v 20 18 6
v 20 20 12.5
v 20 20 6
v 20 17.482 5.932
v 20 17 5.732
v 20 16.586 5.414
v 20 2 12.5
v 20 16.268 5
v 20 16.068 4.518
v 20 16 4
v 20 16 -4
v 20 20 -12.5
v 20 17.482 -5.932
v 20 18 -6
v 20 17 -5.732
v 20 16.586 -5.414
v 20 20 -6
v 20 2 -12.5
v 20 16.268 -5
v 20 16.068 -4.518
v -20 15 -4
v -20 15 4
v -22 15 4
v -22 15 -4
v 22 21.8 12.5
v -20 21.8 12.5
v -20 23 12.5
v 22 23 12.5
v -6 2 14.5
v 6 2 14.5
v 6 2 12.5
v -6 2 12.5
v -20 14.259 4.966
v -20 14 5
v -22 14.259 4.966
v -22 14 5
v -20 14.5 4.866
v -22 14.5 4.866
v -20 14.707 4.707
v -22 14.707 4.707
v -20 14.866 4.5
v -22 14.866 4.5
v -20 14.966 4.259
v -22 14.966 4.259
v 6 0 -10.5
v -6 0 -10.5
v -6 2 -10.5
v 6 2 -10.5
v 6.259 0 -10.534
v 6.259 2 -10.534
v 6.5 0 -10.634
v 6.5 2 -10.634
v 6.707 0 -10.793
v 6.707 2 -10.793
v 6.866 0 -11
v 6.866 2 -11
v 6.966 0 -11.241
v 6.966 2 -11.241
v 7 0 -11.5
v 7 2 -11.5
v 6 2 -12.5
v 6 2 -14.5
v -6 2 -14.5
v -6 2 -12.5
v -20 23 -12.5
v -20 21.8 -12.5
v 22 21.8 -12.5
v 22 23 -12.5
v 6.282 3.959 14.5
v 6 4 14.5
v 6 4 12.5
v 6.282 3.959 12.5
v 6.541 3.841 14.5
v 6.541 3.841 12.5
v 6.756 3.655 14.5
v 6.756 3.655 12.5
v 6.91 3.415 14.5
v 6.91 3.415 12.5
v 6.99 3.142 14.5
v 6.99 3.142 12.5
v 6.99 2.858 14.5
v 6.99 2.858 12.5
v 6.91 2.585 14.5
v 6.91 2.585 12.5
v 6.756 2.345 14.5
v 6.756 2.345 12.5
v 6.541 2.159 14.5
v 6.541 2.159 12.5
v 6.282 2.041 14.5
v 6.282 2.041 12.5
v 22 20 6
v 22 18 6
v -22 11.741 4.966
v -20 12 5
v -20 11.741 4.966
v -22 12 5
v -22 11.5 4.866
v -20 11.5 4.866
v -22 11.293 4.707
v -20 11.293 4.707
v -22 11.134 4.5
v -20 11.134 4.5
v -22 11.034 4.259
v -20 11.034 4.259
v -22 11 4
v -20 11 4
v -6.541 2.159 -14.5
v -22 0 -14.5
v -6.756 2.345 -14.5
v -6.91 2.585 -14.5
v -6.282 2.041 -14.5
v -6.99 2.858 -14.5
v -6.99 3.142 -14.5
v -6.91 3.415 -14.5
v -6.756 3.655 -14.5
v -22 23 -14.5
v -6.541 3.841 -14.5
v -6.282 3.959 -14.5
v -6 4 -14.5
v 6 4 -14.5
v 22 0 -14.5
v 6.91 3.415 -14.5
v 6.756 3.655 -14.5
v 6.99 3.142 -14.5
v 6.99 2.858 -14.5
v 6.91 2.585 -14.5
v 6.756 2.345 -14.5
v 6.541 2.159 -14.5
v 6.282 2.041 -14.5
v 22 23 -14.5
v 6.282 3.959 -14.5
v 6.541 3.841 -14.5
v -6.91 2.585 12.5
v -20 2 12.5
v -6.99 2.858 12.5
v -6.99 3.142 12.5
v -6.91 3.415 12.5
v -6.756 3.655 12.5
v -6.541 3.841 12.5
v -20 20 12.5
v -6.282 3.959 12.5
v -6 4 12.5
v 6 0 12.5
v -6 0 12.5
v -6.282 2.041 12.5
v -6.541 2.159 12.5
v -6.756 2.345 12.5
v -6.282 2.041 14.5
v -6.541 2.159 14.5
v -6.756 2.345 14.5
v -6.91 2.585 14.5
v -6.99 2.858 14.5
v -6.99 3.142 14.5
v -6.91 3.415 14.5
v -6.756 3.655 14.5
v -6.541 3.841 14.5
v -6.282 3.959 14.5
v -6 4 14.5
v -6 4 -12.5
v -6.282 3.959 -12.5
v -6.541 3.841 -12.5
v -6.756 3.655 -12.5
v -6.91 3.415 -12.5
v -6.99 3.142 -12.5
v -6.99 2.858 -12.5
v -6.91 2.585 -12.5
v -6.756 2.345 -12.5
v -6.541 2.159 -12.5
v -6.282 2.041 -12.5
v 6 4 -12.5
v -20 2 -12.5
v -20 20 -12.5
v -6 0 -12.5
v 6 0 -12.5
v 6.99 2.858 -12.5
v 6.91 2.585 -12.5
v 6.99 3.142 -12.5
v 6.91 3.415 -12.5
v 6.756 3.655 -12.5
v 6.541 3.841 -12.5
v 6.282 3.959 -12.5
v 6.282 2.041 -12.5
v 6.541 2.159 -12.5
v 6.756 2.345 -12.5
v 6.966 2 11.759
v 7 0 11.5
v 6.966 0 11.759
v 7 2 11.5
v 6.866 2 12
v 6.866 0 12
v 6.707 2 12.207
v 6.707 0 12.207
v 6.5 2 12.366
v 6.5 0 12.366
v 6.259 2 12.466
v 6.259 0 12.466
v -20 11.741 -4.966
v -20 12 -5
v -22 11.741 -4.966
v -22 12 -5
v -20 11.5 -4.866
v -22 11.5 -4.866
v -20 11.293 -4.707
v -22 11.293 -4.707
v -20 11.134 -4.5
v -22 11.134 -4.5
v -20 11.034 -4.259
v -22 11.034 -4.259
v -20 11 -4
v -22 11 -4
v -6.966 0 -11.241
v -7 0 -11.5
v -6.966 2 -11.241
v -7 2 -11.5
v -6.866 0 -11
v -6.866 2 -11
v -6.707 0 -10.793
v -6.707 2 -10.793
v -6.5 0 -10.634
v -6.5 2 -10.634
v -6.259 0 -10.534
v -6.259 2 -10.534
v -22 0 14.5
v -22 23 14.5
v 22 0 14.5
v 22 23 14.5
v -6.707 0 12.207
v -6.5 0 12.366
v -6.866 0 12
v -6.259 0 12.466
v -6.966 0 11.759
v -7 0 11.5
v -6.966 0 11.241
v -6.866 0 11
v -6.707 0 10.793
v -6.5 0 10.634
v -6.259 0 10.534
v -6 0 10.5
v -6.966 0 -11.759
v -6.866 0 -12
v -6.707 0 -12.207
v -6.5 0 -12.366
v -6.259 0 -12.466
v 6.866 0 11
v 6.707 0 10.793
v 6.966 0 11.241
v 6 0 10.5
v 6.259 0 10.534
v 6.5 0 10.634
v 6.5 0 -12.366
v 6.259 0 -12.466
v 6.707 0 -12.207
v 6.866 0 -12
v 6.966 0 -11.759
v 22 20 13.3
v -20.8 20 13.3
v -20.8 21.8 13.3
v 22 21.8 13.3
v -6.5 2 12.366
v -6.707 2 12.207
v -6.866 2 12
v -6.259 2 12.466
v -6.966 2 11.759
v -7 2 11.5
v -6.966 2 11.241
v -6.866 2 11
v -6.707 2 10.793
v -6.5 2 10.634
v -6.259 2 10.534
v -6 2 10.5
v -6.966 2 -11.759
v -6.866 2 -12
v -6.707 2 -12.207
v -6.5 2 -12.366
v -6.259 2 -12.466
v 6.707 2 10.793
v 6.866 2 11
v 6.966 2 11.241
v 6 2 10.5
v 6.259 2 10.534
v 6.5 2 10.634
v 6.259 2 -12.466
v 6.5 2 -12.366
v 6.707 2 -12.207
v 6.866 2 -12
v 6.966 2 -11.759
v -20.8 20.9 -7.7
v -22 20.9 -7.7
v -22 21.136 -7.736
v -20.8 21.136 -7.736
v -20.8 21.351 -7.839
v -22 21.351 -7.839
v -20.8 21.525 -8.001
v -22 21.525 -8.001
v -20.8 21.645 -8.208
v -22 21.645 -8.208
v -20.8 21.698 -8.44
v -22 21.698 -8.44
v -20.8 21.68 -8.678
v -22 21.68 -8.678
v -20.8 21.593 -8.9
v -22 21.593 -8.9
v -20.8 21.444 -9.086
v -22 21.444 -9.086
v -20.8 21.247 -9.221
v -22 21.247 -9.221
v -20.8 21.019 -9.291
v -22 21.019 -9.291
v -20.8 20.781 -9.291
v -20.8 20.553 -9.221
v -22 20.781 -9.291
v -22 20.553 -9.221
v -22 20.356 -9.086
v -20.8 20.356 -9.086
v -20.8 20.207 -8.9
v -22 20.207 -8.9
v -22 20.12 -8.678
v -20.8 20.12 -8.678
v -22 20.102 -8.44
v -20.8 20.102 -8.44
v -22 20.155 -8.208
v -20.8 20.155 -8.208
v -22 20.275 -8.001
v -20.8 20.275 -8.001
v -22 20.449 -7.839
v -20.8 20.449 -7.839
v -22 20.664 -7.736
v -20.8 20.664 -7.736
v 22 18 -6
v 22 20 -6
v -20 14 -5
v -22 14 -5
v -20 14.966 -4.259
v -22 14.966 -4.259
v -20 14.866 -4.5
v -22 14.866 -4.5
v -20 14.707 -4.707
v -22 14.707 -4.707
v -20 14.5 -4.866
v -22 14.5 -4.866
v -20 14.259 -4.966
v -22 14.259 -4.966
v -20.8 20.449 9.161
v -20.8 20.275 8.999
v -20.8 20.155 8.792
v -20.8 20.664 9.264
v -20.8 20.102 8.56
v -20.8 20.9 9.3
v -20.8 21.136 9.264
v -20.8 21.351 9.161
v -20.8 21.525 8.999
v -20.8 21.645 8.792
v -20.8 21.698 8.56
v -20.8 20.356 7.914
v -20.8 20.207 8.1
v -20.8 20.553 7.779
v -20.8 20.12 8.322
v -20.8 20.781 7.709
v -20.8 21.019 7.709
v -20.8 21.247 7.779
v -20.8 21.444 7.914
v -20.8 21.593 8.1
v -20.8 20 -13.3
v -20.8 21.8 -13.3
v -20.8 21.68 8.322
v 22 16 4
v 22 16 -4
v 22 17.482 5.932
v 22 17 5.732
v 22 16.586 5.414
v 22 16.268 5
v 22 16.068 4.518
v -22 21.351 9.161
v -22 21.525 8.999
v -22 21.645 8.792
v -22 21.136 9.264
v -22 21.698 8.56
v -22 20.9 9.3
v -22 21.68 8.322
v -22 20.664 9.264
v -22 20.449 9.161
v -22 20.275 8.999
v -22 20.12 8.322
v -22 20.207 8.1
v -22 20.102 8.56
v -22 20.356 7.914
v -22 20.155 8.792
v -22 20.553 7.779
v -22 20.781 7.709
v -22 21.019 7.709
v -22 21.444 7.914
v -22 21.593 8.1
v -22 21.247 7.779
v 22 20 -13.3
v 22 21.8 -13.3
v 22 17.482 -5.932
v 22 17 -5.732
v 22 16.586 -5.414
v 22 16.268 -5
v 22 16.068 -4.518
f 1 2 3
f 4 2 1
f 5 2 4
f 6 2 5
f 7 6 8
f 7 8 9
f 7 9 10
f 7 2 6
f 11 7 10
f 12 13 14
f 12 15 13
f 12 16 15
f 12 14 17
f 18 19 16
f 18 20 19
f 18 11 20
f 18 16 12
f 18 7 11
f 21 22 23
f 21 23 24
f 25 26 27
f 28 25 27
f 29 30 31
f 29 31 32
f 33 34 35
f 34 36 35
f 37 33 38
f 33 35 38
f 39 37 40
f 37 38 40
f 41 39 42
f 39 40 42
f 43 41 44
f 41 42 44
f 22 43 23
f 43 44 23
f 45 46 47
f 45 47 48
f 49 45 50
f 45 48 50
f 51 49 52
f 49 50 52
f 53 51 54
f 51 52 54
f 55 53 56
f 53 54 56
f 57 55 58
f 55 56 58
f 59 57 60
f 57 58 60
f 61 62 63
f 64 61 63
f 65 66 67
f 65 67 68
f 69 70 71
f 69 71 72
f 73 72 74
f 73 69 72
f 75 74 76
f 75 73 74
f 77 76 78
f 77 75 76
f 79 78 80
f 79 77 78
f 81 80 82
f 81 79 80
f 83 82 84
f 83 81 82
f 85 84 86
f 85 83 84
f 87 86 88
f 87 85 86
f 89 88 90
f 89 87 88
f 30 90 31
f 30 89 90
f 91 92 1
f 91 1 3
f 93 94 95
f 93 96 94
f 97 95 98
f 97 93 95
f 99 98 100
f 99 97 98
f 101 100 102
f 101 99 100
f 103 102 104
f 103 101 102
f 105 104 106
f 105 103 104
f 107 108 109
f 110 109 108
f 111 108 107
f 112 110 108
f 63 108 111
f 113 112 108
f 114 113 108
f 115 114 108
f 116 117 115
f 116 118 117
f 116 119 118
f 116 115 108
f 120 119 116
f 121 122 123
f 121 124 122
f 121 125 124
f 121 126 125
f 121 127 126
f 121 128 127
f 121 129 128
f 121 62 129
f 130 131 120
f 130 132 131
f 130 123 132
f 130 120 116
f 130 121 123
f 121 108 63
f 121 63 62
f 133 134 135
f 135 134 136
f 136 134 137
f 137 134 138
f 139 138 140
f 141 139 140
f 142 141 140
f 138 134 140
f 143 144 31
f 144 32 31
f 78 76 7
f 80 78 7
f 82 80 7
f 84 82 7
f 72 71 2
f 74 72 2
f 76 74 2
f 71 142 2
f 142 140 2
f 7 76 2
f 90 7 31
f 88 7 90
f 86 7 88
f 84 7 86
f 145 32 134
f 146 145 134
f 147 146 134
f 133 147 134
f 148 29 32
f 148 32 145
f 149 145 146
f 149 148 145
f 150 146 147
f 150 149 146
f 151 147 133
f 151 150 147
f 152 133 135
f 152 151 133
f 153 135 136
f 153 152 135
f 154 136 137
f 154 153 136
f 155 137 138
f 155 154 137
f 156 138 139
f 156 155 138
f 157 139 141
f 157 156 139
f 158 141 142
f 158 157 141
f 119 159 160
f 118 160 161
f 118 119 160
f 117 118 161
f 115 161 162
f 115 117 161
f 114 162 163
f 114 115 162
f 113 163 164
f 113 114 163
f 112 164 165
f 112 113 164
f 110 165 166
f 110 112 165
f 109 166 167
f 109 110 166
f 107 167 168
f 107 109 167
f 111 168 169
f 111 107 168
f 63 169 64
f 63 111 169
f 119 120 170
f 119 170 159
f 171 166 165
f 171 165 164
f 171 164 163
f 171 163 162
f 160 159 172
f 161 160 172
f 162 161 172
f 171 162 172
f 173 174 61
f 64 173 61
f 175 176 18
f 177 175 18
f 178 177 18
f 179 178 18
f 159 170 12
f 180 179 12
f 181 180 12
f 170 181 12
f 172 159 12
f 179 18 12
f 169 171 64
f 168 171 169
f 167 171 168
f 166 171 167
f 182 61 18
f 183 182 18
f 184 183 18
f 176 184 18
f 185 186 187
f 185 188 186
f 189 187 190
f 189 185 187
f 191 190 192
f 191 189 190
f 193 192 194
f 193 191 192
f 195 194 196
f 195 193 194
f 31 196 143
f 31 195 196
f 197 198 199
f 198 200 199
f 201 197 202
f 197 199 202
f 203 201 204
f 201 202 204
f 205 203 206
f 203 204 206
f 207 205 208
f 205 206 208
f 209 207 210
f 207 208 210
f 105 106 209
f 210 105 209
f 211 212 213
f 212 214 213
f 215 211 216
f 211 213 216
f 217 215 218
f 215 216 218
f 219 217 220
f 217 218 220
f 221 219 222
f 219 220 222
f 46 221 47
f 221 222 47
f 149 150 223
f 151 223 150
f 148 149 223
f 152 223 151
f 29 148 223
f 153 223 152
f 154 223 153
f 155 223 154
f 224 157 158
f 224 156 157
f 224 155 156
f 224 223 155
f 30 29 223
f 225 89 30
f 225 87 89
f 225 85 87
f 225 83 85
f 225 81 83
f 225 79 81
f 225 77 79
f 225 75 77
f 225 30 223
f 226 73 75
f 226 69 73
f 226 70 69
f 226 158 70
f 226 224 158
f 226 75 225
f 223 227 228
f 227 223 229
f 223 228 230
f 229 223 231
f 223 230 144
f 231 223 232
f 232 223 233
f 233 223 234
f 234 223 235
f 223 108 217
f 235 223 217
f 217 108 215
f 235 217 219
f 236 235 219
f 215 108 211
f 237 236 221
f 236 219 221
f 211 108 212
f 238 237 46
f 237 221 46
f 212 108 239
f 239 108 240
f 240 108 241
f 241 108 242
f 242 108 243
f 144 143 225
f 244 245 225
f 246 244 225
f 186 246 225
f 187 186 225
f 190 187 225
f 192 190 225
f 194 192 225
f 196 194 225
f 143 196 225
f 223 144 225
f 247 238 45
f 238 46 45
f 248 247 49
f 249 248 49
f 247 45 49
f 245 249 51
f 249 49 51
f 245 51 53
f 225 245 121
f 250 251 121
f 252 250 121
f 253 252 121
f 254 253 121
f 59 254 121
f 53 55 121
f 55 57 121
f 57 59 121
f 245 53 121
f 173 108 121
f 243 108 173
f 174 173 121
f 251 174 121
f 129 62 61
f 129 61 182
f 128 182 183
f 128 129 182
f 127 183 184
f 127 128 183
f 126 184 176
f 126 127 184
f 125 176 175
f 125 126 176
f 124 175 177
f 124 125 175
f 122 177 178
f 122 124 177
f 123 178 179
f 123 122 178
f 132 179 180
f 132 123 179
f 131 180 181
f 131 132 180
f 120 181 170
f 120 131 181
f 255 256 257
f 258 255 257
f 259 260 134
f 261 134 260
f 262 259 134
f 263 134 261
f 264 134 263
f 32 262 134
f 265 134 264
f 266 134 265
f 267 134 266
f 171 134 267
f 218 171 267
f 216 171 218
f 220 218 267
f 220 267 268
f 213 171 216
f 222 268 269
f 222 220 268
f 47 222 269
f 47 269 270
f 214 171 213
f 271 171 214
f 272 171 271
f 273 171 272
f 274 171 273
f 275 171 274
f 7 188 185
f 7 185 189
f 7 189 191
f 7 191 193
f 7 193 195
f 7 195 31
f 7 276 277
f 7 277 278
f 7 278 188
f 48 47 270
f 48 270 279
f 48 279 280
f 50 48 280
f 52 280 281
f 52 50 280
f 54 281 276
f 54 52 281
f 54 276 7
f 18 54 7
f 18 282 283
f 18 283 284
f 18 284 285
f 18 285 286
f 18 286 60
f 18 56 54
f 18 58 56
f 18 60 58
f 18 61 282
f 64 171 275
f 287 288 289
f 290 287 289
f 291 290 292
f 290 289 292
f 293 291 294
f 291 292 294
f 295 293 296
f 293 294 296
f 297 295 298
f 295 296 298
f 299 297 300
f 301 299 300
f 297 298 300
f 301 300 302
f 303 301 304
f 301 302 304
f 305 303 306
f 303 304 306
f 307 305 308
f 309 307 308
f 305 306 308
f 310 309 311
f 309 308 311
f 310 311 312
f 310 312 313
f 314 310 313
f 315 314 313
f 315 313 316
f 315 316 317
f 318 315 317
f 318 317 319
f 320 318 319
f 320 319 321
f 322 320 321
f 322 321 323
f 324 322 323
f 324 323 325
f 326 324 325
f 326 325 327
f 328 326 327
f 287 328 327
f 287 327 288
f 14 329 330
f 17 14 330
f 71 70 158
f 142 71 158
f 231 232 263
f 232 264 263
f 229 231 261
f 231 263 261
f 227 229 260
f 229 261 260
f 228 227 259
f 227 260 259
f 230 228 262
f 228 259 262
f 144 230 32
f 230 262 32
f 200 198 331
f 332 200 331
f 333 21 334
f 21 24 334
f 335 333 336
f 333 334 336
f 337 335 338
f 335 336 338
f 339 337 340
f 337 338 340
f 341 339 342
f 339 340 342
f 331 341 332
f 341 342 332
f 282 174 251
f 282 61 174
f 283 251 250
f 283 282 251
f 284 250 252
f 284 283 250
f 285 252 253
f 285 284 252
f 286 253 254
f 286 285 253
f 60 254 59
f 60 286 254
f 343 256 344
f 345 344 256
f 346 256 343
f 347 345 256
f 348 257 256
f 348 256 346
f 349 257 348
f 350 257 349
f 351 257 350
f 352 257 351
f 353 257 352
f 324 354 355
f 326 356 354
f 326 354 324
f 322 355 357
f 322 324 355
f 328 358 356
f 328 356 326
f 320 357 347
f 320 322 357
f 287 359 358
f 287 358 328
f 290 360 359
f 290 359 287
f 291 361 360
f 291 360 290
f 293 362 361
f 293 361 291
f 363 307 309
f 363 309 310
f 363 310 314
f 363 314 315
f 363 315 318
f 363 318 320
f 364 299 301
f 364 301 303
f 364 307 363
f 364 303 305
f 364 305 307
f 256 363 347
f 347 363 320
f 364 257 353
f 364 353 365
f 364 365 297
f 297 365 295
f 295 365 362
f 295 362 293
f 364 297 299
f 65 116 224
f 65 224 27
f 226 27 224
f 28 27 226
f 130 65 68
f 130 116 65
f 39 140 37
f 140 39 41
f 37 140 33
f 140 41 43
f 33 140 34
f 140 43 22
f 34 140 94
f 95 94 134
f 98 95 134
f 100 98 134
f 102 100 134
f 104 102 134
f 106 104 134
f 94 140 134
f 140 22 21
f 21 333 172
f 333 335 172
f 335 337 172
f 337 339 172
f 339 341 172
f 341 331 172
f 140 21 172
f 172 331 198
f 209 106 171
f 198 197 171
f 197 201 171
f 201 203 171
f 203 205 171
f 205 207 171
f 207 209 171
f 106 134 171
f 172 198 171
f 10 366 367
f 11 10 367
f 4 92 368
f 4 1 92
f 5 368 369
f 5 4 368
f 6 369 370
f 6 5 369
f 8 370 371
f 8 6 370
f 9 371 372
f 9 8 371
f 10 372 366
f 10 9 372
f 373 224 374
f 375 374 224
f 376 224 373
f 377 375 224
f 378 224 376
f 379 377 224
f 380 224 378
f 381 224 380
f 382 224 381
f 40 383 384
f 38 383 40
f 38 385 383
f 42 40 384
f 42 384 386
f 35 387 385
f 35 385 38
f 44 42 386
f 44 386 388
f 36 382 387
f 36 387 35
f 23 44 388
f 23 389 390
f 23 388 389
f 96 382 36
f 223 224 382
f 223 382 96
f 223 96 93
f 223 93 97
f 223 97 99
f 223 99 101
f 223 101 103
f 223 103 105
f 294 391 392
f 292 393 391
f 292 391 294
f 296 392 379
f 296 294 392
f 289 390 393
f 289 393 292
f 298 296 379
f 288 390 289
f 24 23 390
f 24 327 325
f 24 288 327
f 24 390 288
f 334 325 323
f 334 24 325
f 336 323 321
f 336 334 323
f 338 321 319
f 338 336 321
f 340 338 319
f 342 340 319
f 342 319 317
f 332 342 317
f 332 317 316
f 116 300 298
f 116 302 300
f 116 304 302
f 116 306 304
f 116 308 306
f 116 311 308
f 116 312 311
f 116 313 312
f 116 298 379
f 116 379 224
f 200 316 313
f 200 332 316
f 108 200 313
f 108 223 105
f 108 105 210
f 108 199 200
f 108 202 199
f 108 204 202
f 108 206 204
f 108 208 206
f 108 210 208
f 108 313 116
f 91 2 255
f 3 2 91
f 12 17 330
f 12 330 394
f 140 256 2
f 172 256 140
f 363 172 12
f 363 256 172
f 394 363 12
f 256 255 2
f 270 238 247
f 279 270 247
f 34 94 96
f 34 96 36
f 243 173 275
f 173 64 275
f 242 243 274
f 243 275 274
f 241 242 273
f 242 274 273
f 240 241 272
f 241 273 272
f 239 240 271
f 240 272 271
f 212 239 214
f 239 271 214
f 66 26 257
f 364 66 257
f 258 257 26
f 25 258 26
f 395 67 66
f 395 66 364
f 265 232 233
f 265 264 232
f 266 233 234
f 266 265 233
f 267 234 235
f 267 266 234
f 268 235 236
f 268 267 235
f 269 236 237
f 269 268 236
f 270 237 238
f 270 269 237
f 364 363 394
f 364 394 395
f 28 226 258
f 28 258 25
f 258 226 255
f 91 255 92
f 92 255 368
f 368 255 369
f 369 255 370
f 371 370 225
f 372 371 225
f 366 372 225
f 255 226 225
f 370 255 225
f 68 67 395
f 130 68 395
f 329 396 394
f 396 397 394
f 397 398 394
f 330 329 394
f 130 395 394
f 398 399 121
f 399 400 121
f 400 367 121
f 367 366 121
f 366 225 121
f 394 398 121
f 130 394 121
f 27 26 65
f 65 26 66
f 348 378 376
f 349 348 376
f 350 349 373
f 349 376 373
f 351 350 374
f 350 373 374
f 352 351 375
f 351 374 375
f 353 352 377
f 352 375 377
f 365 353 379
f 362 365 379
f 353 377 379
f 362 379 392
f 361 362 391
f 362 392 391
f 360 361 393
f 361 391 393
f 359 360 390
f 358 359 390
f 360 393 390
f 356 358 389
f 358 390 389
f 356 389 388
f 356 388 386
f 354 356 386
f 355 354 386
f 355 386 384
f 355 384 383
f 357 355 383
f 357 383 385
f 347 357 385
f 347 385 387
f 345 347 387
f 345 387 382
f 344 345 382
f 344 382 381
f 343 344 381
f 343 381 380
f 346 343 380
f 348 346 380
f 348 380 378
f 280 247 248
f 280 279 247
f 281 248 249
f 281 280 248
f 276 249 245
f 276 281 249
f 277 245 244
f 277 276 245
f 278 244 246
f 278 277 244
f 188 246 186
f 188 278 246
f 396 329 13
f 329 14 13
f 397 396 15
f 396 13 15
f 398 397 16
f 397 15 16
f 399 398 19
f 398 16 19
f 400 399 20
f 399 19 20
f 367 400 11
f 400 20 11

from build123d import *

# Parameters (mm, degrees)
SKETCH_1_W             = 44
SKETCH_1_H             = 29
EXTRUDE_1_DEPTH        = 23
SHELL_1_T              = -2
CUT_EXTRUDE_1_REACH    = 53.723
SKETCH_2_W             = 12
SKETCH_2_H             = 7
CUT_EXTRUDE_2_REACH    = 52.032
SKETCH_3_W             = 10
SKETCH_3_H             = 4
FILLET_1_R             = 1
FILLET_2_R             = 2
CUT_EXTRUDE_START      = -2
SKETCH_4_W             = 25
SKETCH_4_H             = 3
CUT_EXTRUDE_3_DEPTH    = 2
SKETCH_5_W             = 26.6
SKETCH_5_H             = 1.8
CUT_EXTRUDE_4_DEPTH    = 42.8
CUT_EXTRUDE_5_REACH    = 53.723
SKETCH_6_R             = 0.8
CUT_EXTRUDE_6_REACH    = 36.975
SKETCH_8_W             = 14
SKETCH_8_H             = 2
CUT_EXTRUDE_7_REACH    = 45.058
SKETCH_9_W             = 14
SKETCH_9_H             = 2
FILLET_3_R             = 1
FILLET_4_R             = 1
FILLET_3_OF_MIRROR_1_R = 1
FILLET_4_OF_MIRROR_1_R = 1


# Some blends are built 0.0001 mm under size
with BuildPart() as part:
    # 草图1 → 凸台-拉伸1 (new body)
    with BuildSketch(Plane(origin=(0, 0, 0), x_dir=(1, 0, 0), z_dir=(0, 1, 0))):
        Rectangle(SKETCH_1_W, SKETCH_1_H)
    extrude(amount=EXTRUDE_1_DEPTH)

    # 抽壳1
    shell_1_openings = [part.faces().sort_by_distance(p)[0] for p in [
        (0, 23, 0),
    ]]
    offset(amount=SHELL_1_T, openings=shell_1_openings, kind=Kind.INTERSECTION)

    # 草图2 → 切除-拉伸1 (cut, up to next)
    with BuildSketch(Plane(origin=(22, 0, 0), x_dir=(0, 0, -1), z_dir=(1, 0, 0)), mode=Mode.PRIVATE) as cut_extrude_1_sk1:
        with Locations((0, 19.5)):
            Rectangle(SKETCH_2_W, SKETCH_2_H)
    cut_extrude_1_tool1 = extrude(cut_extrude_1_sk1.sketch, amount=-CUT_EXTRUDE_1_REACH, mode=Mode.PRIVATE) & part.part
    add(cut_extrude_1_tool1.solids().sort_by_distance((22, 19.5, 0))[0], mode=Mode.SUBTRACT)

    # 草图3 → 切除-拉伸2 (cut, up to next)
    with BuildSketch(Plane(origin=(-20, 0, 0), x_dir=(0, 0, -1), z_dir=(1, 0, 0)), mode=Mode.PRIVATE) as cut_extrude_2_sk1:
        with Locations((0, 13)):
            Rectangle(SKETCH_3_W, SKETCH_3_H)
    cut_extrude_2_tool1 = extrude(cut_extrude_2_sk1.sketch, amount=-CUT_EXTRUDE_2_REACH, mode=Mode.PRIVATE) & part.part
    add(cut_extrude_2_tool1.solids().sort_by_distance((-20, 13, 0))[0], mode=Mode.SUBTRACT)

    # 圆角1
    fillet_1_edges = [part.edges().sort_by_distance(p)[0] for p in [
        (-21, 11, 5),
        (-21, 15, 5),
        (-21, 15, -5),
        (-21, 11, -5),
    ]]
    fillet(fillet_1_edges, radius=FILLET_1_R)

    # 圆角2
    fillet_2_edges = [part.edges().sort_by_distance(p)[0] for p in [
        (21, 16, 6),
        (21, 16, -6),
    ]]
    fillet(fillet_2_edges, radius=FILLET_2_R)

    # 草图4 → 切除-拉伸3 (cut)
    with BuildSketch(Plane(origin=(22, 0, 0), x_dir=(0, 0, -1), z_dir=(1, 0, 0)).offset(CUT_EXTRUDE_START)):
        with Locations((0, 21.5)):
            Rectangle(SKETCH_4_W, SKETCH_4_H)
    extrude(amount=CUT_EXTRUDE_3_DEPTH, mode=Mode.SUBTRACT)

    # 草图5 → 切除-拉伸4 (cut)
    with BuildSketch(Plane(origin=(22, 0, 0), x_dir=(0, 0, -1), z_dir=(1, 0, 0))):
        with Locations((0, 20.9)):
            Rectangle(SKETCH_5_W, SKETCH_5_H)
    extrude(amount=-CUT_EXTRUDE_4_DEPTH, mode=Mode.SUBTRACT)

    # 草图6 → 切除-拉伸5 (cut, up to next)
    with BuildSketch(Plane.ZY.offset(22), mode=Mode.PRIVATE) as cut_extrude_5_sk1:
        with Locations((-8.5, 20.9)):
            Circle(SKETCH_6_R)
    cut_extrude_5_tool1 = extrude(cut_extrude_5_sk1.sketch, amount=-CUT_EXTRUDE_5_REACH, mode=Mode.PRIVATE) & part.part
    # 草图6 → 切除-拉伸5 (cut, up to next)
    with BuildSketch(Plane.ZY.offset(22), mode=Mode.PRIVATE) as cut_extrude_5_sk2:
        with Locations((8.5, 20.9)):
            Circle(SKETCH_6_R)
    cut_extrude_5_tool2 = extrude(cut_extrude_5_sk2.sketch, amount=-CUT_EXTRUDE_5_REACH, mode=Mode.PRIVATE) & part.part
    add(cut_extrude_5_tool1.solids().sort_by_distance((-22, 20.9, -8.5))[0], mode=Mode.SUBTRACT)
    add(cut_extrude_5_tool2.solids().sort_by_distance((-22, 20.9, 8.5))[0], mode=Mode.SUBTRACT)

    # 草图8 → 切除-拉伸6 (cut, up to next)
    with BuildSketch(Plane.XZ, mode=Mode.PRIVATE) as cut_extrude_6_sk1:
        with Locations((0, -11.5)):
            Rectangle(SKETCH_8_W, SKETCH_8_H)
    cut_extrude_6_tool1 = extrude(cut_extrude_6_sk1.sketch, amount=-CUT_EXTRUDE_6_REACH, mode=Mode.PRIVATE) & part.part
    cut_extrude_6 = cut_extrude_6_tool1.solids().sort_by_distance((0, 0, -11.5))[0]
    add(cut_extrude_6, mode=Mode.SUBTRACT)

    # 草图9 → 切除-拉伸7 (cut, up to next)
    with BuildSketch(Plane(origin=(0, 0, -14.5), x_dir=(-1, 0, 0), z_dir=(0, 0, -1)), mode=Mode.PRIVATE) as cut_extrude_7_sk1:
        with Locations((0, 3)):
            Rectangle(SKETCH_9_W, SKETCH_9_H)
    cut_extrude_7_tool1 = extrude(cut_extrude_7_sk1.sketch, amount=-CUT_EXTRUDE_7_REACH, mode=Mode.PRIVATE) & part.part
    cut_extrude_7 = cut_extrude_7_tool1.solids().sort_by_distance((0, 3, -14.5))[0]
    add(cut_extrude_7, mode=Mode.SUBTRACT)

    # 圆角3
    # the kernel refuses this fillet: 1 mm, written as the material it adds along each edge
    with BuildSketch(Plane(origin=(-7, 4, -14.5), x_dir=(0, -1, 0), z_dir=(0, 0, 1)), Plane(origin=(-7, 2, -14.5), x_dir=(1, 0, 0), z_dir=(0, 0, 1)), Plane(origin=(7, 2, -14.5), x_dir=(0, 1, 0), z_dir=(0, 0, 1))) as fillet_3_piece_1:
        with BuildLine():
            CenterArc((FILLET_3_R, FILLET_3_R), FILLET_3_R, 180, 90)
            Line((0, FILLET_3_R), (0, 0))
            Line((0, 0), (FILLET_3_R, 0))
        make_face()
    extrude(amount=2)
    with BuildSketch(Plane(origin=(7, 4, -14.5), x_dir=(0, -1, 0), z_dir=(0, 0, 1))) as fillet_3_piece_2:
        with BuildLine():
            CenterArc((FILLET_3_R, -FILLET_3_R), FILLET_3_R, 90, 90)
            Line((0, -FILLET_3_R), (0, 0))
            Line((0, 0), (FILLET_3_R, 0))
        make_face()
    extrude(amount=2)

    # 圆角4
    fillet_4_edges = [part.edges().sort_by_distance(p)[0] for p in [
        (-7, 1, -12.5),
        (-7, 1, -10.5),
        (7, 1, -12.5),
        (7, 1, -10.5),
    ]]
    fillet(fillet_4_edges, radius=FILLET_4_R - 0.0001)  # a hair under: the kernel refuses the full size

    # 镜向1: 切除-拉伸6, 切除-拉伸7 across plane
    add(cut_extrude_6.mirror(Plane.XY), mode=Mode.SUBTRACT)
    add(cut_extrude_7.mirror(Plane.XY), mode=Mode.SUBTRACT)

    # 圆角3 of 镜向1
    # the kernel refuses this fillet: 1 mm, written as the material it adds along each edge
    with BuildSketch(Plane(origin=(-7, 4, 14.5), x_dir=(1, 0, 0), z_dir=(0, 0, -1)), Plane(origin=(-7, 2, 14.5), x_dir=(0, 1, 0), z_dir=(0, 0, -1)), Plane(origin=(7, 2, 14.5), x_dir=(-1, 0, 0), z_dir=(0, 0, -1))) as fillet_3_of_mirror_1_piece_1:
        with BuildLine():
            CenterArc((FILLET_3_OF_MIRROR_1_R, FILLET_3_OF_MIRROR_1_R), FILLET_3_OF_MIRROR_1_R, 180, 90)
            Line((0, FILLET_3_OF_MIRROR_1_R), (0, 0))
            Line((0, 0), (FILLET_3_OF_MIRROR_1_R, 0))
        make_face()
    extrude(amount=2)
    with BuildSketch(Plane(origin=(7, 4, 14.5), x_dir=(-1, 0, 0), z_dir=(0, 0, -1))) as fillet_3_of_mirror_1_piece_2:
        with BuildLine():
            CenterArc((FILLET_3_OF_MIRROR_1_R, -FILLET_3_OF_MIRROR_1_R), FILLET_3_OF_MIRROR_1_R, 90, 90)
            Line((0, -FILLET_3_OF_MIRROR_1_R), (0, 0))
            Line((0, 0), (FILLET_3_OF_MIRROR_1_R, 0))
        make_face()
    extrude(amount=2)

    # 圆角4 of 镜向1
    fillet_4_of_mirror_1_edges = [part.edges().sort_by_distance(p)[0] for p in [
        (-7, 1, 12.5),
        (-7, 1, 10.5),
        (7, 1, 12.5),
        (7, 1, 10.5),
    ]]
    fillet(fillet_4_of_mirror_1_edges, radius=FILLET_4_OF_MIRROR_1_R - 0.0001)  # a hair under: the kernel refuses the full size


solid = part.part
